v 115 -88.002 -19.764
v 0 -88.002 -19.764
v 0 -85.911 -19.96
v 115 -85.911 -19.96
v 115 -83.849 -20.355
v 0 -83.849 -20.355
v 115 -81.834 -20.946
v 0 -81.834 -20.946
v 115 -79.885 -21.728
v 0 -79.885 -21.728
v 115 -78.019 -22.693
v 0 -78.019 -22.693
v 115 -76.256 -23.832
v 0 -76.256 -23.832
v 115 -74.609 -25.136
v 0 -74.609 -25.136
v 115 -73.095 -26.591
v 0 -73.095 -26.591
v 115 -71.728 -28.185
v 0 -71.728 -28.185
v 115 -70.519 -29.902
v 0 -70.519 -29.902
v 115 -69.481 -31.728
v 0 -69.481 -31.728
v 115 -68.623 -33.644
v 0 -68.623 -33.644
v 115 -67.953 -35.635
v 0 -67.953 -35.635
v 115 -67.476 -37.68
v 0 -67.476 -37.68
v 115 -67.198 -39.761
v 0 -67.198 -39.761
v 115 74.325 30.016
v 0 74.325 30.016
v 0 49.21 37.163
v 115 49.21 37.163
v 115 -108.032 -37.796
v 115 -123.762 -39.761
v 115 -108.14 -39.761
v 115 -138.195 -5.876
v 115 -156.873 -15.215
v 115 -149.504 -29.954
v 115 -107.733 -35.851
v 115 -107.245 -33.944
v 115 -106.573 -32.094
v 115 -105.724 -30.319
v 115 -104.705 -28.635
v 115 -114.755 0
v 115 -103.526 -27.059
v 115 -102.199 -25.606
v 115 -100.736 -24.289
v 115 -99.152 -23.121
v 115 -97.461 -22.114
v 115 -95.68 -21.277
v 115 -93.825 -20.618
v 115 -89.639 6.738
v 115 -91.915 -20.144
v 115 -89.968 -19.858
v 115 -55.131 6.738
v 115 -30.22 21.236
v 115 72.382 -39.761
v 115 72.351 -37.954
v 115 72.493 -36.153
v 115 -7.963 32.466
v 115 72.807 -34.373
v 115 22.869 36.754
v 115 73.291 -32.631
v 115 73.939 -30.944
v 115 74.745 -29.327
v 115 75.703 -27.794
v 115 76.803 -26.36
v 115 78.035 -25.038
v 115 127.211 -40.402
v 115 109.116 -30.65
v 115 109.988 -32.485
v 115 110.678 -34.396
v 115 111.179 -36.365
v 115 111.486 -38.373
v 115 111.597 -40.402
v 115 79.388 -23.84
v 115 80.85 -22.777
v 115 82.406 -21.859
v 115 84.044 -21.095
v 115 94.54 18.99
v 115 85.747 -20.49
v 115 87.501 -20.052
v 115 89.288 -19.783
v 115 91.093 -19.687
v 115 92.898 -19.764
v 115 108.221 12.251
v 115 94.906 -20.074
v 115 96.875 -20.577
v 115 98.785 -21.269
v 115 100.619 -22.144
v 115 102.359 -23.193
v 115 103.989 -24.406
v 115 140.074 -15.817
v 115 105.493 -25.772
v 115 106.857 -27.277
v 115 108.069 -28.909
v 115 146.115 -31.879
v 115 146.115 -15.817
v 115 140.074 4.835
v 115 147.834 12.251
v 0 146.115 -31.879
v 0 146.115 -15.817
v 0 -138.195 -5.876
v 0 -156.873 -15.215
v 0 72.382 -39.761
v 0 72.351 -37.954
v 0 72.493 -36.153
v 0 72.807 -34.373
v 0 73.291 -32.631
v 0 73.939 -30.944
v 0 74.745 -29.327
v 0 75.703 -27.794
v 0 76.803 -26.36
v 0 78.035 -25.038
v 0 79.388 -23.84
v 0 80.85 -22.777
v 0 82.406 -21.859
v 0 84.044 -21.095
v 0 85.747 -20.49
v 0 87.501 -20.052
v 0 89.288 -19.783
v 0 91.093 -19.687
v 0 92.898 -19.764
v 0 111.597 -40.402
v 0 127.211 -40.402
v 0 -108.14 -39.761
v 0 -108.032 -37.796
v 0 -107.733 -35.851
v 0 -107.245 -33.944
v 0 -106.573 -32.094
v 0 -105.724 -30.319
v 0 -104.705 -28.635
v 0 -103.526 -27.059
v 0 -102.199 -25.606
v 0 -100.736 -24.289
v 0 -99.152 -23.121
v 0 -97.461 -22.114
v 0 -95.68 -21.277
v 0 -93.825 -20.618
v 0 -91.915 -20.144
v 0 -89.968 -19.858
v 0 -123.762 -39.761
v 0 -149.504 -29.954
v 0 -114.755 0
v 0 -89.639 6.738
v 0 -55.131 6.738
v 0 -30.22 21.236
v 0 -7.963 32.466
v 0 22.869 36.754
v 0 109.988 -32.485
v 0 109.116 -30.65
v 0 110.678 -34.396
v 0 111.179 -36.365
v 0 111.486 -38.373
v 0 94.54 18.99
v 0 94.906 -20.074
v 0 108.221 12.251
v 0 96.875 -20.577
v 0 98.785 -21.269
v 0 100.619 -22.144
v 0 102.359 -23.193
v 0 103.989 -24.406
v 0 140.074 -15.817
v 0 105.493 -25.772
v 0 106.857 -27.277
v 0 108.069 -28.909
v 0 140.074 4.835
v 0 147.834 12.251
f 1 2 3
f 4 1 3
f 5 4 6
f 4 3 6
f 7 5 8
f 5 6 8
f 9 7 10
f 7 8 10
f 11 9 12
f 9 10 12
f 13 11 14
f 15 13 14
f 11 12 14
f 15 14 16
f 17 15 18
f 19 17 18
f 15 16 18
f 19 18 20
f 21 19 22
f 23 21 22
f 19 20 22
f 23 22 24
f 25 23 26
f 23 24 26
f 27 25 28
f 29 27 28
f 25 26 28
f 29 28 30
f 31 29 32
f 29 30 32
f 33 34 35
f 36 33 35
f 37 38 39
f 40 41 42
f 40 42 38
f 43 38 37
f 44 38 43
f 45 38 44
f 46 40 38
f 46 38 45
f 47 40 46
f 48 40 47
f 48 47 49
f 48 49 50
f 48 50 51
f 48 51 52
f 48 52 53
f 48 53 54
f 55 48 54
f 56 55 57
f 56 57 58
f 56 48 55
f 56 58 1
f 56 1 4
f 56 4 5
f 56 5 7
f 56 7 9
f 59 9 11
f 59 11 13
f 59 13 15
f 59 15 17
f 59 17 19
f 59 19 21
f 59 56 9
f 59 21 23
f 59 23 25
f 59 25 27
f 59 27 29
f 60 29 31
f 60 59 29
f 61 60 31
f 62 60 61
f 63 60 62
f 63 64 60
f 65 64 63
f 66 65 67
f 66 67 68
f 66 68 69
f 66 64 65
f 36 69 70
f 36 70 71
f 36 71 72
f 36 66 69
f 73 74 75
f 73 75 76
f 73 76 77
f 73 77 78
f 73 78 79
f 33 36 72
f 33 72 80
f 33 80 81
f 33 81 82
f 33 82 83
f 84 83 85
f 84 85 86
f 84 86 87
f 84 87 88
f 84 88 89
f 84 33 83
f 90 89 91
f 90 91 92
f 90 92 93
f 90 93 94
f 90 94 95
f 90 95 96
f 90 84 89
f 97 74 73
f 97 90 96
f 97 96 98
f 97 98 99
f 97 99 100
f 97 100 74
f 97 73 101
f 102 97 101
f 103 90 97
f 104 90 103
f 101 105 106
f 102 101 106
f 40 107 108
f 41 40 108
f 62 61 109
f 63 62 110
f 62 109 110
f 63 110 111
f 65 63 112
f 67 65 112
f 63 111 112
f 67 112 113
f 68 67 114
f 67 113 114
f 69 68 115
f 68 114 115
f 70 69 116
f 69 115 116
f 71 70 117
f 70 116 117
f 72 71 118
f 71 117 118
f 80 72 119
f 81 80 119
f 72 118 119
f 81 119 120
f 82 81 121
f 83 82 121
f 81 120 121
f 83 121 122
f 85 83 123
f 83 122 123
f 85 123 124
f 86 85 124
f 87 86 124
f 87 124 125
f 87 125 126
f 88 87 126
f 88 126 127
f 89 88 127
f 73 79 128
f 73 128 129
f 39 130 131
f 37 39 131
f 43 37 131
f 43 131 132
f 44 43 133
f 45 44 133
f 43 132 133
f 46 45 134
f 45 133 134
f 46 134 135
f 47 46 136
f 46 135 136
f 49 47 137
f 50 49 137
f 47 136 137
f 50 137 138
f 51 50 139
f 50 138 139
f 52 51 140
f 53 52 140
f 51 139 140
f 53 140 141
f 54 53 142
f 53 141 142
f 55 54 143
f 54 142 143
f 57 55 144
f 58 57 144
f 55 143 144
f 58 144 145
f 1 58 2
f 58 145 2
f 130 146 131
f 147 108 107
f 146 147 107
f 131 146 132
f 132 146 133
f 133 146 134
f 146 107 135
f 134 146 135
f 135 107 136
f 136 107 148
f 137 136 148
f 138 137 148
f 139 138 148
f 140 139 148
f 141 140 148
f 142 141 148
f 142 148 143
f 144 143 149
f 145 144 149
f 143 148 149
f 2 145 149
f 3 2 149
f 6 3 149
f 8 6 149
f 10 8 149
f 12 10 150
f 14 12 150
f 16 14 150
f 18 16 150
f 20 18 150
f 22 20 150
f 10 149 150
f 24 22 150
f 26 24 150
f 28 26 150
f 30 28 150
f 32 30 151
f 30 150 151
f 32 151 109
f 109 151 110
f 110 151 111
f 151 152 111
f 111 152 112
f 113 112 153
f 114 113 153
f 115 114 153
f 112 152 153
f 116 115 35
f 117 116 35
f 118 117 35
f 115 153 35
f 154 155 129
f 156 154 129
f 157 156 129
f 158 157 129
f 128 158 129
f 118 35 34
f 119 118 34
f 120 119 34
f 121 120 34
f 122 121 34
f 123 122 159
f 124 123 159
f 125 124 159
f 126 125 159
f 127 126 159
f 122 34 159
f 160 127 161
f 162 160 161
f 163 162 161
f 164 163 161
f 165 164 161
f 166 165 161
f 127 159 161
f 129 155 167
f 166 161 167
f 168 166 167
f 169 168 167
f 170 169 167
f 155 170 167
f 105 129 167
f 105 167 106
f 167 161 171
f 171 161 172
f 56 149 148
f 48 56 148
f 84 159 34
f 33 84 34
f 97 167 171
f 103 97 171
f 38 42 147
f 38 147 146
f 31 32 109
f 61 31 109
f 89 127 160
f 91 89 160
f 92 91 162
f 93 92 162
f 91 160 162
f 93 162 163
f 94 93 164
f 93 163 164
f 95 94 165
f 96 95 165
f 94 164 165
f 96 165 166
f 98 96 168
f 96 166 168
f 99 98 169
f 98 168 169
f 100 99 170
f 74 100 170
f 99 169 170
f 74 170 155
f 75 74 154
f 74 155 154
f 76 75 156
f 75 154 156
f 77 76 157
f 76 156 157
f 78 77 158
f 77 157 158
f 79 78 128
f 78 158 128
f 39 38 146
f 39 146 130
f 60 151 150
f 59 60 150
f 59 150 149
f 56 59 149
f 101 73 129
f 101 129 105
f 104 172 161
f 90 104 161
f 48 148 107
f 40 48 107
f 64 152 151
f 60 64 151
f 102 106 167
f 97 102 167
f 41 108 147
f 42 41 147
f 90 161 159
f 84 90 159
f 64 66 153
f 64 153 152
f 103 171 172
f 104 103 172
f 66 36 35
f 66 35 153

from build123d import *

# Parameters (mm, degrees)
F1_DEPTH = 115


with BuildPart() as f1:
    # F0 (on Right) → F1 (new body)
    with BuildSketch(Plane.YZ):
        with BuildLine():
            Line((-89.63947, 6.738275), (-114.754856, 0))
            Line((-114.754856, 0), (-138.194978, -5.876377))
            Line((-138.194978, -5.876377), (-156.873196, -15.215486))
            Line((-156.873196, -15.215486), (-149.503788, -29.954302))
            Line((-149.503788, -29.954302), (-123.761818, -39.761275))
            Line((-123.761818, -39.761275), (-108.140029, -39.761275))
            ThreePointArc((-108.140029, -39.761275), (-102.198985, -25.605666), (-88.001989, -19.764215))
            ThreePointArc((-88.001989, -19.764215), (-73.834486, -25.845282), (-67.198023, -39.761275))
            Line((-67.198023, -39.761275), (-37.212595, -39.761275))
            Line((-37.212595, -39.761275), (72.381705, -39.761275))
            ThreePointArc((72.381705, -39.761275), (78.034801, -25.038001), (92.89816, -19.764215))
            ThreePointArc((92.89816, -19.764215), (106.193601, -26.50791), (111.596704, -40.402249))
            Line((111.596704, -40.402249), (127.211124, -40.402249))
            Line((127.211124, -40.402249), (146.114811, -31.879209))
            Line((146.114811, -31.879209), (146.114811, -15.81654))
            Line((146.114811, -15.81654), (140.074372, -15.81654))
            Line((140.074372, -15.81654), (140.074372, 4.835445))
            Line((140.074372, 4.835445), (147.833586, 12.251377))
            Line((147.833586, 12.251377), (140.074372, 12.251377))
            Line((140.074372, 12.251377), (108.220726, 12.251377))
            Line((108.220726, 12.251377), (94.54, 18.989645))
            Line((94.54, 18.989645), (74.325174, 30.015916))
            Line((74.325174, 30.015916), (49.209803, 37.162594))
            Line((49.209803, 37.162594), (22.869274, 36.754213))
            Line((22.869274, 36.754213), (-7.963434, 32.466225))
            Line((-7.963434, 32.466225), (-30.220151, 21.235771))
            Line((-30.220151, 21.235771), (-55.131346, 6.738275))
            Line((-55.131346, 6.738275), (-89.63947, 6.738275))
        make_face()
    extrude(amount=F1_DEPTH)


solid = f1.part
